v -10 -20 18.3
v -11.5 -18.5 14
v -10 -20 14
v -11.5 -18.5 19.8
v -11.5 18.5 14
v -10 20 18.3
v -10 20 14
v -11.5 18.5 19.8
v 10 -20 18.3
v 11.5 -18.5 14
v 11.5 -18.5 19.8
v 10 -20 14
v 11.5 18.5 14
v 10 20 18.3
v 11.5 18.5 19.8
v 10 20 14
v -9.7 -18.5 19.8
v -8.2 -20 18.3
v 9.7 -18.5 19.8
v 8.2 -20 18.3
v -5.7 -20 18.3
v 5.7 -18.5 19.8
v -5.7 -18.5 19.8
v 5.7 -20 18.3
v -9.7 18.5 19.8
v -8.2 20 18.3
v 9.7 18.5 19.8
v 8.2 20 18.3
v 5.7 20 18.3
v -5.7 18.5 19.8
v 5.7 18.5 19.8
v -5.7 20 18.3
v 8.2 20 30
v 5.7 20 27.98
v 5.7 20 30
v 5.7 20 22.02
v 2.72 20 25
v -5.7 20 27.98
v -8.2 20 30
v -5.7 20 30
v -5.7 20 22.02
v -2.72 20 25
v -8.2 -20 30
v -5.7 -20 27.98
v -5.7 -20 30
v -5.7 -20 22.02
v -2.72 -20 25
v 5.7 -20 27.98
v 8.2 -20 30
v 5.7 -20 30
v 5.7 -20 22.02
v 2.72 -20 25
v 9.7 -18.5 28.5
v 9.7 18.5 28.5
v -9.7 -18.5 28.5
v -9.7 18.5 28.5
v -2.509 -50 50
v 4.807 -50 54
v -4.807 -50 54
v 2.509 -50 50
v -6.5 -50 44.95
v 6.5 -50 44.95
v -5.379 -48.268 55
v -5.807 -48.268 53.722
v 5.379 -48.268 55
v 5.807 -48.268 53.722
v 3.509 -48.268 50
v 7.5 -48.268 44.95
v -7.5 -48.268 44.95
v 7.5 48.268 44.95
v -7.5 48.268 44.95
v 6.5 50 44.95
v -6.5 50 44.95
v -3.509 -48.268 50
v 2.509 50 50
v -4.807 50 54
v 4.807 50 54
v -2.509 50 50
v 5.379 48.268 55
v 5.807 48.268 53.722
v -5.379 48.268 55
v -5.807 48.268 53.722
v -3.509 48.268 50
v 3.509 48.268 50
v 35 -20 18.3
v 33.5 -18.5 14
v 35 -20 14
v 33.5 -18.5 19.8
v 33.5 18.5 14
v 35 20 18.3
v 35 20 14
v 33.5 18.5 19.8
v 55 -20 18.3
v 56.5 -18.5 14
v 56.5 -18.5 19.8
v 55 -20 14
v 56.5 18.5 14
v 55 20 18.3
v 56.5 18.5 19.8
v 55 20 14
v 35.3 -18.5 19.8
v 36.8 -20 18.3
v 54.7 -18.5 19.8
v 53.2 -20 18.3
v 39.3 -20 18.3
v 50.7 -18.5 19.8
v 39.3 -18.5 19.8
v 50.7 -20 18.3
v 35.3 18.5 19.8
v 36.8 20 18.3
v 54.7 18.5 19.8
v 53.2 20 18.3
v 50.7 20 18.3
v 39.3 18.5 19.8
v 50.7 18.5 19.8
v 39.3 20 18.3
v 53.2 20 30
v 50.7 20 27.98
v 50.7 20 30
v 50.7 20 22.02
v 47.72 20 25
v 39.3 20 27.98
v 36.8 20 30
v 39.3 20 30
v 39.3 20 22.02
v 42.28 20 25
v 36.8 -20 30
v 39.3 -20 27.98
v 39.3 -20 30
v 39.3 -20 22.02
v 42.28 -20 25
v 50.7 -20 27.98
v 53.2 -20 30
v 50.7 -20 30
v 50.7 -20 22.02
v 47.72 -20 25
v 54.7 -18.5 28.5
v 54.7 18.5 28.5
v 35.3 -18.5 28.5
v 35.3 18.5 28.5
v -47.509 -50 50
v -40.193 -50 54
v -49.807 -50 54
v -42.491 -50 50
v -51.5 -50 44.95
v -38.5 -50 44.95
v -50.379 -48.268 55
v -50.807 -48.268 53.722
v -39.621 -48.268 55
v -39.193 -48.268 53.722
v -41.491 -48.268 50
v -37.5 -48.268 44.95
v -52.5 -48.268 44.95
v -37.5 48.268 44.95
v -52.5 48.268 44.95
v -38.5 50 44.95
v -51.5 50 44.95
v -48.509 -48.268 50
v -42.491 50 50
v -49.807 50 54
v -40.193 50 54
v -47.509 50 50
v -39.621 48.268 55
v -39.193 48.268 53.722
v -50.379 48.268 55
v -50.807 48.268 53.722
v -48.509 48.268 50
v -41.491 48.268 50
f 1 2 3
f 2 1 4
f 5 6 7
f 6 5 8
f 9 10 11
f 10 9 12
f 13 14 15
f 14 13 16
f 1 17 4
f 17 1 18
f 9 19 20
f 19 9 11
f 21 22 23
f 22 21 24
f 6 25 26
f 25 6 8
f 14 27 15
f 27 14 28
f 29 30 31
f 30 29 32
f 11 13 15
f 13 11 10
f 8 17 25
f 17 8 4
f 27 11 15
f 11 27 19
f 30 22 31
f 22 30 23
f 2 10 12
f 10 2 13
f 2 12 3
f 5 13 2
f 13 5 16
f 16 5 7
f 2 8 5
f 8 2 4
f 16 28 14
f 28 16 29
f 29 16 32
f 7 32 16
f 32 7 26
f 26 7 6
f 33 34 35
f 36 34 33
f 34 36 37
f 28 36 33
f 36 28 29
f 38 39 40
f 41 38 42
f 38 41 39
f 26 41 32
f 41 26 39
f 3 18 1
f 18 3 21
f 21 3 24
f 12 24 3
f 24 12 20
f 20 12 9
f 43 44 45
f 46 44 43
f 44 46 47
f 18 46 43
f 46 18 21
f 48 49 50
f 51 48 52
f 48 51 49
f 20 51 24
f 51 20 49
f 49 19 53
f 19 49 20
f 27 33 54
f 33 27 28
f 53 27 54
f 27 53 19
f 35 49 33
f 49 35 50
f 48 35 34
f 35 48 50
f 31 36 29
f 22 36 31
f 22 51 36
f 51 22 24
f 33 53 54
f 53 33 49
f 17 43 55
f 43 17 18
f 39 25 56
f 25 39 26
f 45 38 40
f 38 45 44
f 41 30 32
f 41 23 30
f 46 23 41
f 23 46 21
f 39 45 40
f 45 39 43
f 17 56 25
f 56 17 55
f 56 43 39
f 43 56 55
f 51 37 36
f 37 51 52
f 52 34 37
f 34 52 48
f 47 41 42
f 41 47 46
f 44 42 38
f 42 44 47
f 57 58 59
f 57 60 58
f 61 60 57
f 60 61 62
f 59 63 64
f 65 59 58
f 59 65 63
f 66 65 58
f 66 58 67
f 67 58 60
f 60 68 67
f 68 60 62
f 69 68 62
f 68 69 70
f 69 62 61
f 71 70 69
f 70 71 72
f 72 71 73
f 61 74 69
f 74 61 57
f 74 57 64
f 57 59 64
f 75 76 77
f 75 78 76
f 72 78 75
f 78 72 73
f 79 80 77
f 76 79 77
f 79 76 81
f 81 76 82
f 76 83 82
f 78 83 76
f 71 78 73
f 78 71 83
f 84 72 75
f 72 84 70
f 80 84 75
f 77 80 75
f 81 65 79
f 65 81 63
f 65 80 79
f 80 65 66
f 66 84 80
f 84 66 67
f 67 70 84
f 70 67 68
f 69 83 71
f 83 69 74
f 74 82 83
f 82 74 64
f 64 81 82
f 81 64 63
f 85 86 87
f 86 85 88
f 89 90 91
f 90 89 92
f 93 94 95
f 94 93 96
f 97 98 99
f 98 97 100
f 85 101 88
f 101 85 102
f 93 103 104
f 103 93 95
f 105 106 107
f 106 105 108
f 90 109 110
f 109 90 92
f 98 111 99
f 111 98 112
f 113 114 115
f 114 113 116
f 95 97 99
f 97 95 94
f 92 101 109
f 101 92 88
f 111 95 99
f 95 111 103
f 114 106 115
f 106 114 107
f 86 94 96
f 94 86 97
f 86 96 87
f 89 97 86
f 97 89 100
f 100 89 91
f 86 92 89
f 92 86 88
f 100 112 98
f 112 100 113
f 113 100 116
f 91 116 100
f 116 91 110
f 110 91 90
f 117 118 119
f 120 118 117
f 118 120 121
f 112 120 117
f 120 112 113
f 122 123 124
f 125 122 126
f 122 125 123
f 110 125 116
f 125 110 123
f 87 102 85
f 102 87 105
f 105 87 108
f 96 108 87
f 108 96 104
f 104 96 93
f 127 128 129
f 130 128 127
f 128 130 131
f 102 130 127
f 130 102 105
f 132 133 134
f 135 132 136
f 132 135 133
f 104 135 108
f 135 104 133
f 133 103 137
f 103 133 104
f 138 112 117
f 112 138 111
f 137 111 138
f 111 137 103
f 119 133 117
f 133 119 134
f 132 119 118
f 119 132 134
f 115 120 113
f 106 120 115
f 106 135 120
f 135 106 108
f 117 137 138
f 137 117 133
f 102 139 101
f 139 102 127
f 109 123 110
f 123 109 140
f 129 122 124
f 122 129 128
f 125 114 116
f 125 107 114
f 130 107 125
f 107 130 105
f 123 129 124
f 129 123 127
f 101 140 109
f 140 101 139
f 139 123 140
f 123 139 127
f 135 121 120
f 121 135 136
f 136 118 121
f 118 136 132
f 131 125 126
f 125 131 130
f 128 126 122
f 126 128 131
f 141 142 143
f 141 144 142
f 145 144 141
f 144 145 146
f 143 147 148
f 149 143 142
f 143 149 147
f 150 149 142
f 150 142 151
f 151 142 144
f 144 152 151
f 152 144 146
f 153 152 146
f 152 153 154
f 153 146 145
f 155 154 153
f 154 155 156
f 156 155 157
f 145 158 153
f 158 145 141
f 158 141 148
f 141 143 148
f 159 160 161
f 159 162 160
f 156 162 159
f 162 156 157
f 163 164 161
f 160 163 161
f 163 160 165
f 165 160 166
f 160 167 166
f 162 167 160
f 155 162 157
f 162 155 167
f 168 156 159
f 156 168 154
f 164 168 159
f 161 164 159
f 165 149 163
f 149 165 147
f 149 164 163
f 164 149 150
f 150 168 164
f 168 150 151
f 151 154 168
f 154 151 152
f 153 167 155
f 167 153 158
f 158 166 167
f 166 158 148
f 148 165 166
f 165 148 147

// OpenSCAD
// file: GEOL/transforms.scad
// GEOL (Geometric Engine Optimized Library) - Transforms Module
// Highly optimized, library-free transformation shortcuts and distribution patterns.
// Created: 2026-05-18

// 1. Translation shortcut
module move(x=0, y=0, z=0) {
    translate([x, y, z]) children();
}

// 2. Rotation shortcuts
module xrot(a=0) {
    rotate([a, 0, 0]) children();
}

module yrot(a=0) {
    rotate([0, a, 0]) children();
}

module zrot(a=0) {
    rotate([0, 0, a]) children();
}

// 3. Mirroring helpers (retains original and adds mirrored child)
module mirror_x() {
    children();
    mirror([1, 0, 0]) children();
}

module mirror_y() {
    children();
    mirror([0, 1, 0]) children();
}

module mirror_z() {
    children();
    mirror([0, 0, 1]) children();
}

// 4. Grid Distribution Grid Spread
module grid_spread(spacing_x=20, spacing_y=20, count_x=2, count_y=2) {
    start_x = -((count_x - 1) * spacing_x) / 2;
    start_y = -((count_y - 1) * spacing_y) / 2;
    
    for (i = [0 : count_x - 1]) {
        for (j = [0 : count_y - 1]) {
            translate([start_x + i * spacing_x, start_y + j * spacing_y, 0]) {
                children();
            }
        }
    }
}

// 5. Radial Distribution
module radial_spread(r=10, count=6) {
    for (i = [0 : count - 1]) {
        angle = i * (360 / count);
        rotate([0, 0, angle]) {
            translate([r, 0, 0]) {
                children();
            }
        }
    }
}
// main file
// GEOL (Geometric Engine Optimized Library) - Sliders Showcase
// Demonstrates high-performance carriage sliders and rails.
// Evaluates in milliseconds using OpenCascade B-Rep!

use <GEOL/transforms.scad>
use <GEOL/sliders.scad>

echo("--- STARTING SHOWCASE: GEOL SLIDERS & RAILS ---");

// 1. Assembled Slider & Rail Combination (Center, X = 0)
// Demonstrates precise 0.2mm slop tolerances for absolute alignment
translate([0, 0, 0]) {
    color("dodgerblue") {
        rail(l=100, w=15, h=10, chamfer=1.5, ang=45);
    }
    translate([0, 0, 5]) {
        color("gold") {
            slider(l=40, w=15, h=10, chamfer=1.5, base=6, wall=4, ang=45, slop=0.2);
        }
    }
}

// 2. Standalone Rail (Left, X = -45)
// Showcases V-groove guide track profiles and end attack angles
translate([-45, 0, 0]) {
    color("deepskyblue") {
        rail(l=100, w=15, h=10, chamfer=1.5, ang=45);
    }
}

// 3. Standalone Slider Block (Right, X = 45)
// Showcases V-protrusion wedges and secure side mounting walls
translate([45, 0, 5]) {
    color("crimson") {
        slider(l=40, w=15, h=10, chamfer=1.5, base=6, wall=4, ang=45, slop=0.2);
    }
}

echo("--- SHOWCASE PREPARED FOR VIEWING ---");
